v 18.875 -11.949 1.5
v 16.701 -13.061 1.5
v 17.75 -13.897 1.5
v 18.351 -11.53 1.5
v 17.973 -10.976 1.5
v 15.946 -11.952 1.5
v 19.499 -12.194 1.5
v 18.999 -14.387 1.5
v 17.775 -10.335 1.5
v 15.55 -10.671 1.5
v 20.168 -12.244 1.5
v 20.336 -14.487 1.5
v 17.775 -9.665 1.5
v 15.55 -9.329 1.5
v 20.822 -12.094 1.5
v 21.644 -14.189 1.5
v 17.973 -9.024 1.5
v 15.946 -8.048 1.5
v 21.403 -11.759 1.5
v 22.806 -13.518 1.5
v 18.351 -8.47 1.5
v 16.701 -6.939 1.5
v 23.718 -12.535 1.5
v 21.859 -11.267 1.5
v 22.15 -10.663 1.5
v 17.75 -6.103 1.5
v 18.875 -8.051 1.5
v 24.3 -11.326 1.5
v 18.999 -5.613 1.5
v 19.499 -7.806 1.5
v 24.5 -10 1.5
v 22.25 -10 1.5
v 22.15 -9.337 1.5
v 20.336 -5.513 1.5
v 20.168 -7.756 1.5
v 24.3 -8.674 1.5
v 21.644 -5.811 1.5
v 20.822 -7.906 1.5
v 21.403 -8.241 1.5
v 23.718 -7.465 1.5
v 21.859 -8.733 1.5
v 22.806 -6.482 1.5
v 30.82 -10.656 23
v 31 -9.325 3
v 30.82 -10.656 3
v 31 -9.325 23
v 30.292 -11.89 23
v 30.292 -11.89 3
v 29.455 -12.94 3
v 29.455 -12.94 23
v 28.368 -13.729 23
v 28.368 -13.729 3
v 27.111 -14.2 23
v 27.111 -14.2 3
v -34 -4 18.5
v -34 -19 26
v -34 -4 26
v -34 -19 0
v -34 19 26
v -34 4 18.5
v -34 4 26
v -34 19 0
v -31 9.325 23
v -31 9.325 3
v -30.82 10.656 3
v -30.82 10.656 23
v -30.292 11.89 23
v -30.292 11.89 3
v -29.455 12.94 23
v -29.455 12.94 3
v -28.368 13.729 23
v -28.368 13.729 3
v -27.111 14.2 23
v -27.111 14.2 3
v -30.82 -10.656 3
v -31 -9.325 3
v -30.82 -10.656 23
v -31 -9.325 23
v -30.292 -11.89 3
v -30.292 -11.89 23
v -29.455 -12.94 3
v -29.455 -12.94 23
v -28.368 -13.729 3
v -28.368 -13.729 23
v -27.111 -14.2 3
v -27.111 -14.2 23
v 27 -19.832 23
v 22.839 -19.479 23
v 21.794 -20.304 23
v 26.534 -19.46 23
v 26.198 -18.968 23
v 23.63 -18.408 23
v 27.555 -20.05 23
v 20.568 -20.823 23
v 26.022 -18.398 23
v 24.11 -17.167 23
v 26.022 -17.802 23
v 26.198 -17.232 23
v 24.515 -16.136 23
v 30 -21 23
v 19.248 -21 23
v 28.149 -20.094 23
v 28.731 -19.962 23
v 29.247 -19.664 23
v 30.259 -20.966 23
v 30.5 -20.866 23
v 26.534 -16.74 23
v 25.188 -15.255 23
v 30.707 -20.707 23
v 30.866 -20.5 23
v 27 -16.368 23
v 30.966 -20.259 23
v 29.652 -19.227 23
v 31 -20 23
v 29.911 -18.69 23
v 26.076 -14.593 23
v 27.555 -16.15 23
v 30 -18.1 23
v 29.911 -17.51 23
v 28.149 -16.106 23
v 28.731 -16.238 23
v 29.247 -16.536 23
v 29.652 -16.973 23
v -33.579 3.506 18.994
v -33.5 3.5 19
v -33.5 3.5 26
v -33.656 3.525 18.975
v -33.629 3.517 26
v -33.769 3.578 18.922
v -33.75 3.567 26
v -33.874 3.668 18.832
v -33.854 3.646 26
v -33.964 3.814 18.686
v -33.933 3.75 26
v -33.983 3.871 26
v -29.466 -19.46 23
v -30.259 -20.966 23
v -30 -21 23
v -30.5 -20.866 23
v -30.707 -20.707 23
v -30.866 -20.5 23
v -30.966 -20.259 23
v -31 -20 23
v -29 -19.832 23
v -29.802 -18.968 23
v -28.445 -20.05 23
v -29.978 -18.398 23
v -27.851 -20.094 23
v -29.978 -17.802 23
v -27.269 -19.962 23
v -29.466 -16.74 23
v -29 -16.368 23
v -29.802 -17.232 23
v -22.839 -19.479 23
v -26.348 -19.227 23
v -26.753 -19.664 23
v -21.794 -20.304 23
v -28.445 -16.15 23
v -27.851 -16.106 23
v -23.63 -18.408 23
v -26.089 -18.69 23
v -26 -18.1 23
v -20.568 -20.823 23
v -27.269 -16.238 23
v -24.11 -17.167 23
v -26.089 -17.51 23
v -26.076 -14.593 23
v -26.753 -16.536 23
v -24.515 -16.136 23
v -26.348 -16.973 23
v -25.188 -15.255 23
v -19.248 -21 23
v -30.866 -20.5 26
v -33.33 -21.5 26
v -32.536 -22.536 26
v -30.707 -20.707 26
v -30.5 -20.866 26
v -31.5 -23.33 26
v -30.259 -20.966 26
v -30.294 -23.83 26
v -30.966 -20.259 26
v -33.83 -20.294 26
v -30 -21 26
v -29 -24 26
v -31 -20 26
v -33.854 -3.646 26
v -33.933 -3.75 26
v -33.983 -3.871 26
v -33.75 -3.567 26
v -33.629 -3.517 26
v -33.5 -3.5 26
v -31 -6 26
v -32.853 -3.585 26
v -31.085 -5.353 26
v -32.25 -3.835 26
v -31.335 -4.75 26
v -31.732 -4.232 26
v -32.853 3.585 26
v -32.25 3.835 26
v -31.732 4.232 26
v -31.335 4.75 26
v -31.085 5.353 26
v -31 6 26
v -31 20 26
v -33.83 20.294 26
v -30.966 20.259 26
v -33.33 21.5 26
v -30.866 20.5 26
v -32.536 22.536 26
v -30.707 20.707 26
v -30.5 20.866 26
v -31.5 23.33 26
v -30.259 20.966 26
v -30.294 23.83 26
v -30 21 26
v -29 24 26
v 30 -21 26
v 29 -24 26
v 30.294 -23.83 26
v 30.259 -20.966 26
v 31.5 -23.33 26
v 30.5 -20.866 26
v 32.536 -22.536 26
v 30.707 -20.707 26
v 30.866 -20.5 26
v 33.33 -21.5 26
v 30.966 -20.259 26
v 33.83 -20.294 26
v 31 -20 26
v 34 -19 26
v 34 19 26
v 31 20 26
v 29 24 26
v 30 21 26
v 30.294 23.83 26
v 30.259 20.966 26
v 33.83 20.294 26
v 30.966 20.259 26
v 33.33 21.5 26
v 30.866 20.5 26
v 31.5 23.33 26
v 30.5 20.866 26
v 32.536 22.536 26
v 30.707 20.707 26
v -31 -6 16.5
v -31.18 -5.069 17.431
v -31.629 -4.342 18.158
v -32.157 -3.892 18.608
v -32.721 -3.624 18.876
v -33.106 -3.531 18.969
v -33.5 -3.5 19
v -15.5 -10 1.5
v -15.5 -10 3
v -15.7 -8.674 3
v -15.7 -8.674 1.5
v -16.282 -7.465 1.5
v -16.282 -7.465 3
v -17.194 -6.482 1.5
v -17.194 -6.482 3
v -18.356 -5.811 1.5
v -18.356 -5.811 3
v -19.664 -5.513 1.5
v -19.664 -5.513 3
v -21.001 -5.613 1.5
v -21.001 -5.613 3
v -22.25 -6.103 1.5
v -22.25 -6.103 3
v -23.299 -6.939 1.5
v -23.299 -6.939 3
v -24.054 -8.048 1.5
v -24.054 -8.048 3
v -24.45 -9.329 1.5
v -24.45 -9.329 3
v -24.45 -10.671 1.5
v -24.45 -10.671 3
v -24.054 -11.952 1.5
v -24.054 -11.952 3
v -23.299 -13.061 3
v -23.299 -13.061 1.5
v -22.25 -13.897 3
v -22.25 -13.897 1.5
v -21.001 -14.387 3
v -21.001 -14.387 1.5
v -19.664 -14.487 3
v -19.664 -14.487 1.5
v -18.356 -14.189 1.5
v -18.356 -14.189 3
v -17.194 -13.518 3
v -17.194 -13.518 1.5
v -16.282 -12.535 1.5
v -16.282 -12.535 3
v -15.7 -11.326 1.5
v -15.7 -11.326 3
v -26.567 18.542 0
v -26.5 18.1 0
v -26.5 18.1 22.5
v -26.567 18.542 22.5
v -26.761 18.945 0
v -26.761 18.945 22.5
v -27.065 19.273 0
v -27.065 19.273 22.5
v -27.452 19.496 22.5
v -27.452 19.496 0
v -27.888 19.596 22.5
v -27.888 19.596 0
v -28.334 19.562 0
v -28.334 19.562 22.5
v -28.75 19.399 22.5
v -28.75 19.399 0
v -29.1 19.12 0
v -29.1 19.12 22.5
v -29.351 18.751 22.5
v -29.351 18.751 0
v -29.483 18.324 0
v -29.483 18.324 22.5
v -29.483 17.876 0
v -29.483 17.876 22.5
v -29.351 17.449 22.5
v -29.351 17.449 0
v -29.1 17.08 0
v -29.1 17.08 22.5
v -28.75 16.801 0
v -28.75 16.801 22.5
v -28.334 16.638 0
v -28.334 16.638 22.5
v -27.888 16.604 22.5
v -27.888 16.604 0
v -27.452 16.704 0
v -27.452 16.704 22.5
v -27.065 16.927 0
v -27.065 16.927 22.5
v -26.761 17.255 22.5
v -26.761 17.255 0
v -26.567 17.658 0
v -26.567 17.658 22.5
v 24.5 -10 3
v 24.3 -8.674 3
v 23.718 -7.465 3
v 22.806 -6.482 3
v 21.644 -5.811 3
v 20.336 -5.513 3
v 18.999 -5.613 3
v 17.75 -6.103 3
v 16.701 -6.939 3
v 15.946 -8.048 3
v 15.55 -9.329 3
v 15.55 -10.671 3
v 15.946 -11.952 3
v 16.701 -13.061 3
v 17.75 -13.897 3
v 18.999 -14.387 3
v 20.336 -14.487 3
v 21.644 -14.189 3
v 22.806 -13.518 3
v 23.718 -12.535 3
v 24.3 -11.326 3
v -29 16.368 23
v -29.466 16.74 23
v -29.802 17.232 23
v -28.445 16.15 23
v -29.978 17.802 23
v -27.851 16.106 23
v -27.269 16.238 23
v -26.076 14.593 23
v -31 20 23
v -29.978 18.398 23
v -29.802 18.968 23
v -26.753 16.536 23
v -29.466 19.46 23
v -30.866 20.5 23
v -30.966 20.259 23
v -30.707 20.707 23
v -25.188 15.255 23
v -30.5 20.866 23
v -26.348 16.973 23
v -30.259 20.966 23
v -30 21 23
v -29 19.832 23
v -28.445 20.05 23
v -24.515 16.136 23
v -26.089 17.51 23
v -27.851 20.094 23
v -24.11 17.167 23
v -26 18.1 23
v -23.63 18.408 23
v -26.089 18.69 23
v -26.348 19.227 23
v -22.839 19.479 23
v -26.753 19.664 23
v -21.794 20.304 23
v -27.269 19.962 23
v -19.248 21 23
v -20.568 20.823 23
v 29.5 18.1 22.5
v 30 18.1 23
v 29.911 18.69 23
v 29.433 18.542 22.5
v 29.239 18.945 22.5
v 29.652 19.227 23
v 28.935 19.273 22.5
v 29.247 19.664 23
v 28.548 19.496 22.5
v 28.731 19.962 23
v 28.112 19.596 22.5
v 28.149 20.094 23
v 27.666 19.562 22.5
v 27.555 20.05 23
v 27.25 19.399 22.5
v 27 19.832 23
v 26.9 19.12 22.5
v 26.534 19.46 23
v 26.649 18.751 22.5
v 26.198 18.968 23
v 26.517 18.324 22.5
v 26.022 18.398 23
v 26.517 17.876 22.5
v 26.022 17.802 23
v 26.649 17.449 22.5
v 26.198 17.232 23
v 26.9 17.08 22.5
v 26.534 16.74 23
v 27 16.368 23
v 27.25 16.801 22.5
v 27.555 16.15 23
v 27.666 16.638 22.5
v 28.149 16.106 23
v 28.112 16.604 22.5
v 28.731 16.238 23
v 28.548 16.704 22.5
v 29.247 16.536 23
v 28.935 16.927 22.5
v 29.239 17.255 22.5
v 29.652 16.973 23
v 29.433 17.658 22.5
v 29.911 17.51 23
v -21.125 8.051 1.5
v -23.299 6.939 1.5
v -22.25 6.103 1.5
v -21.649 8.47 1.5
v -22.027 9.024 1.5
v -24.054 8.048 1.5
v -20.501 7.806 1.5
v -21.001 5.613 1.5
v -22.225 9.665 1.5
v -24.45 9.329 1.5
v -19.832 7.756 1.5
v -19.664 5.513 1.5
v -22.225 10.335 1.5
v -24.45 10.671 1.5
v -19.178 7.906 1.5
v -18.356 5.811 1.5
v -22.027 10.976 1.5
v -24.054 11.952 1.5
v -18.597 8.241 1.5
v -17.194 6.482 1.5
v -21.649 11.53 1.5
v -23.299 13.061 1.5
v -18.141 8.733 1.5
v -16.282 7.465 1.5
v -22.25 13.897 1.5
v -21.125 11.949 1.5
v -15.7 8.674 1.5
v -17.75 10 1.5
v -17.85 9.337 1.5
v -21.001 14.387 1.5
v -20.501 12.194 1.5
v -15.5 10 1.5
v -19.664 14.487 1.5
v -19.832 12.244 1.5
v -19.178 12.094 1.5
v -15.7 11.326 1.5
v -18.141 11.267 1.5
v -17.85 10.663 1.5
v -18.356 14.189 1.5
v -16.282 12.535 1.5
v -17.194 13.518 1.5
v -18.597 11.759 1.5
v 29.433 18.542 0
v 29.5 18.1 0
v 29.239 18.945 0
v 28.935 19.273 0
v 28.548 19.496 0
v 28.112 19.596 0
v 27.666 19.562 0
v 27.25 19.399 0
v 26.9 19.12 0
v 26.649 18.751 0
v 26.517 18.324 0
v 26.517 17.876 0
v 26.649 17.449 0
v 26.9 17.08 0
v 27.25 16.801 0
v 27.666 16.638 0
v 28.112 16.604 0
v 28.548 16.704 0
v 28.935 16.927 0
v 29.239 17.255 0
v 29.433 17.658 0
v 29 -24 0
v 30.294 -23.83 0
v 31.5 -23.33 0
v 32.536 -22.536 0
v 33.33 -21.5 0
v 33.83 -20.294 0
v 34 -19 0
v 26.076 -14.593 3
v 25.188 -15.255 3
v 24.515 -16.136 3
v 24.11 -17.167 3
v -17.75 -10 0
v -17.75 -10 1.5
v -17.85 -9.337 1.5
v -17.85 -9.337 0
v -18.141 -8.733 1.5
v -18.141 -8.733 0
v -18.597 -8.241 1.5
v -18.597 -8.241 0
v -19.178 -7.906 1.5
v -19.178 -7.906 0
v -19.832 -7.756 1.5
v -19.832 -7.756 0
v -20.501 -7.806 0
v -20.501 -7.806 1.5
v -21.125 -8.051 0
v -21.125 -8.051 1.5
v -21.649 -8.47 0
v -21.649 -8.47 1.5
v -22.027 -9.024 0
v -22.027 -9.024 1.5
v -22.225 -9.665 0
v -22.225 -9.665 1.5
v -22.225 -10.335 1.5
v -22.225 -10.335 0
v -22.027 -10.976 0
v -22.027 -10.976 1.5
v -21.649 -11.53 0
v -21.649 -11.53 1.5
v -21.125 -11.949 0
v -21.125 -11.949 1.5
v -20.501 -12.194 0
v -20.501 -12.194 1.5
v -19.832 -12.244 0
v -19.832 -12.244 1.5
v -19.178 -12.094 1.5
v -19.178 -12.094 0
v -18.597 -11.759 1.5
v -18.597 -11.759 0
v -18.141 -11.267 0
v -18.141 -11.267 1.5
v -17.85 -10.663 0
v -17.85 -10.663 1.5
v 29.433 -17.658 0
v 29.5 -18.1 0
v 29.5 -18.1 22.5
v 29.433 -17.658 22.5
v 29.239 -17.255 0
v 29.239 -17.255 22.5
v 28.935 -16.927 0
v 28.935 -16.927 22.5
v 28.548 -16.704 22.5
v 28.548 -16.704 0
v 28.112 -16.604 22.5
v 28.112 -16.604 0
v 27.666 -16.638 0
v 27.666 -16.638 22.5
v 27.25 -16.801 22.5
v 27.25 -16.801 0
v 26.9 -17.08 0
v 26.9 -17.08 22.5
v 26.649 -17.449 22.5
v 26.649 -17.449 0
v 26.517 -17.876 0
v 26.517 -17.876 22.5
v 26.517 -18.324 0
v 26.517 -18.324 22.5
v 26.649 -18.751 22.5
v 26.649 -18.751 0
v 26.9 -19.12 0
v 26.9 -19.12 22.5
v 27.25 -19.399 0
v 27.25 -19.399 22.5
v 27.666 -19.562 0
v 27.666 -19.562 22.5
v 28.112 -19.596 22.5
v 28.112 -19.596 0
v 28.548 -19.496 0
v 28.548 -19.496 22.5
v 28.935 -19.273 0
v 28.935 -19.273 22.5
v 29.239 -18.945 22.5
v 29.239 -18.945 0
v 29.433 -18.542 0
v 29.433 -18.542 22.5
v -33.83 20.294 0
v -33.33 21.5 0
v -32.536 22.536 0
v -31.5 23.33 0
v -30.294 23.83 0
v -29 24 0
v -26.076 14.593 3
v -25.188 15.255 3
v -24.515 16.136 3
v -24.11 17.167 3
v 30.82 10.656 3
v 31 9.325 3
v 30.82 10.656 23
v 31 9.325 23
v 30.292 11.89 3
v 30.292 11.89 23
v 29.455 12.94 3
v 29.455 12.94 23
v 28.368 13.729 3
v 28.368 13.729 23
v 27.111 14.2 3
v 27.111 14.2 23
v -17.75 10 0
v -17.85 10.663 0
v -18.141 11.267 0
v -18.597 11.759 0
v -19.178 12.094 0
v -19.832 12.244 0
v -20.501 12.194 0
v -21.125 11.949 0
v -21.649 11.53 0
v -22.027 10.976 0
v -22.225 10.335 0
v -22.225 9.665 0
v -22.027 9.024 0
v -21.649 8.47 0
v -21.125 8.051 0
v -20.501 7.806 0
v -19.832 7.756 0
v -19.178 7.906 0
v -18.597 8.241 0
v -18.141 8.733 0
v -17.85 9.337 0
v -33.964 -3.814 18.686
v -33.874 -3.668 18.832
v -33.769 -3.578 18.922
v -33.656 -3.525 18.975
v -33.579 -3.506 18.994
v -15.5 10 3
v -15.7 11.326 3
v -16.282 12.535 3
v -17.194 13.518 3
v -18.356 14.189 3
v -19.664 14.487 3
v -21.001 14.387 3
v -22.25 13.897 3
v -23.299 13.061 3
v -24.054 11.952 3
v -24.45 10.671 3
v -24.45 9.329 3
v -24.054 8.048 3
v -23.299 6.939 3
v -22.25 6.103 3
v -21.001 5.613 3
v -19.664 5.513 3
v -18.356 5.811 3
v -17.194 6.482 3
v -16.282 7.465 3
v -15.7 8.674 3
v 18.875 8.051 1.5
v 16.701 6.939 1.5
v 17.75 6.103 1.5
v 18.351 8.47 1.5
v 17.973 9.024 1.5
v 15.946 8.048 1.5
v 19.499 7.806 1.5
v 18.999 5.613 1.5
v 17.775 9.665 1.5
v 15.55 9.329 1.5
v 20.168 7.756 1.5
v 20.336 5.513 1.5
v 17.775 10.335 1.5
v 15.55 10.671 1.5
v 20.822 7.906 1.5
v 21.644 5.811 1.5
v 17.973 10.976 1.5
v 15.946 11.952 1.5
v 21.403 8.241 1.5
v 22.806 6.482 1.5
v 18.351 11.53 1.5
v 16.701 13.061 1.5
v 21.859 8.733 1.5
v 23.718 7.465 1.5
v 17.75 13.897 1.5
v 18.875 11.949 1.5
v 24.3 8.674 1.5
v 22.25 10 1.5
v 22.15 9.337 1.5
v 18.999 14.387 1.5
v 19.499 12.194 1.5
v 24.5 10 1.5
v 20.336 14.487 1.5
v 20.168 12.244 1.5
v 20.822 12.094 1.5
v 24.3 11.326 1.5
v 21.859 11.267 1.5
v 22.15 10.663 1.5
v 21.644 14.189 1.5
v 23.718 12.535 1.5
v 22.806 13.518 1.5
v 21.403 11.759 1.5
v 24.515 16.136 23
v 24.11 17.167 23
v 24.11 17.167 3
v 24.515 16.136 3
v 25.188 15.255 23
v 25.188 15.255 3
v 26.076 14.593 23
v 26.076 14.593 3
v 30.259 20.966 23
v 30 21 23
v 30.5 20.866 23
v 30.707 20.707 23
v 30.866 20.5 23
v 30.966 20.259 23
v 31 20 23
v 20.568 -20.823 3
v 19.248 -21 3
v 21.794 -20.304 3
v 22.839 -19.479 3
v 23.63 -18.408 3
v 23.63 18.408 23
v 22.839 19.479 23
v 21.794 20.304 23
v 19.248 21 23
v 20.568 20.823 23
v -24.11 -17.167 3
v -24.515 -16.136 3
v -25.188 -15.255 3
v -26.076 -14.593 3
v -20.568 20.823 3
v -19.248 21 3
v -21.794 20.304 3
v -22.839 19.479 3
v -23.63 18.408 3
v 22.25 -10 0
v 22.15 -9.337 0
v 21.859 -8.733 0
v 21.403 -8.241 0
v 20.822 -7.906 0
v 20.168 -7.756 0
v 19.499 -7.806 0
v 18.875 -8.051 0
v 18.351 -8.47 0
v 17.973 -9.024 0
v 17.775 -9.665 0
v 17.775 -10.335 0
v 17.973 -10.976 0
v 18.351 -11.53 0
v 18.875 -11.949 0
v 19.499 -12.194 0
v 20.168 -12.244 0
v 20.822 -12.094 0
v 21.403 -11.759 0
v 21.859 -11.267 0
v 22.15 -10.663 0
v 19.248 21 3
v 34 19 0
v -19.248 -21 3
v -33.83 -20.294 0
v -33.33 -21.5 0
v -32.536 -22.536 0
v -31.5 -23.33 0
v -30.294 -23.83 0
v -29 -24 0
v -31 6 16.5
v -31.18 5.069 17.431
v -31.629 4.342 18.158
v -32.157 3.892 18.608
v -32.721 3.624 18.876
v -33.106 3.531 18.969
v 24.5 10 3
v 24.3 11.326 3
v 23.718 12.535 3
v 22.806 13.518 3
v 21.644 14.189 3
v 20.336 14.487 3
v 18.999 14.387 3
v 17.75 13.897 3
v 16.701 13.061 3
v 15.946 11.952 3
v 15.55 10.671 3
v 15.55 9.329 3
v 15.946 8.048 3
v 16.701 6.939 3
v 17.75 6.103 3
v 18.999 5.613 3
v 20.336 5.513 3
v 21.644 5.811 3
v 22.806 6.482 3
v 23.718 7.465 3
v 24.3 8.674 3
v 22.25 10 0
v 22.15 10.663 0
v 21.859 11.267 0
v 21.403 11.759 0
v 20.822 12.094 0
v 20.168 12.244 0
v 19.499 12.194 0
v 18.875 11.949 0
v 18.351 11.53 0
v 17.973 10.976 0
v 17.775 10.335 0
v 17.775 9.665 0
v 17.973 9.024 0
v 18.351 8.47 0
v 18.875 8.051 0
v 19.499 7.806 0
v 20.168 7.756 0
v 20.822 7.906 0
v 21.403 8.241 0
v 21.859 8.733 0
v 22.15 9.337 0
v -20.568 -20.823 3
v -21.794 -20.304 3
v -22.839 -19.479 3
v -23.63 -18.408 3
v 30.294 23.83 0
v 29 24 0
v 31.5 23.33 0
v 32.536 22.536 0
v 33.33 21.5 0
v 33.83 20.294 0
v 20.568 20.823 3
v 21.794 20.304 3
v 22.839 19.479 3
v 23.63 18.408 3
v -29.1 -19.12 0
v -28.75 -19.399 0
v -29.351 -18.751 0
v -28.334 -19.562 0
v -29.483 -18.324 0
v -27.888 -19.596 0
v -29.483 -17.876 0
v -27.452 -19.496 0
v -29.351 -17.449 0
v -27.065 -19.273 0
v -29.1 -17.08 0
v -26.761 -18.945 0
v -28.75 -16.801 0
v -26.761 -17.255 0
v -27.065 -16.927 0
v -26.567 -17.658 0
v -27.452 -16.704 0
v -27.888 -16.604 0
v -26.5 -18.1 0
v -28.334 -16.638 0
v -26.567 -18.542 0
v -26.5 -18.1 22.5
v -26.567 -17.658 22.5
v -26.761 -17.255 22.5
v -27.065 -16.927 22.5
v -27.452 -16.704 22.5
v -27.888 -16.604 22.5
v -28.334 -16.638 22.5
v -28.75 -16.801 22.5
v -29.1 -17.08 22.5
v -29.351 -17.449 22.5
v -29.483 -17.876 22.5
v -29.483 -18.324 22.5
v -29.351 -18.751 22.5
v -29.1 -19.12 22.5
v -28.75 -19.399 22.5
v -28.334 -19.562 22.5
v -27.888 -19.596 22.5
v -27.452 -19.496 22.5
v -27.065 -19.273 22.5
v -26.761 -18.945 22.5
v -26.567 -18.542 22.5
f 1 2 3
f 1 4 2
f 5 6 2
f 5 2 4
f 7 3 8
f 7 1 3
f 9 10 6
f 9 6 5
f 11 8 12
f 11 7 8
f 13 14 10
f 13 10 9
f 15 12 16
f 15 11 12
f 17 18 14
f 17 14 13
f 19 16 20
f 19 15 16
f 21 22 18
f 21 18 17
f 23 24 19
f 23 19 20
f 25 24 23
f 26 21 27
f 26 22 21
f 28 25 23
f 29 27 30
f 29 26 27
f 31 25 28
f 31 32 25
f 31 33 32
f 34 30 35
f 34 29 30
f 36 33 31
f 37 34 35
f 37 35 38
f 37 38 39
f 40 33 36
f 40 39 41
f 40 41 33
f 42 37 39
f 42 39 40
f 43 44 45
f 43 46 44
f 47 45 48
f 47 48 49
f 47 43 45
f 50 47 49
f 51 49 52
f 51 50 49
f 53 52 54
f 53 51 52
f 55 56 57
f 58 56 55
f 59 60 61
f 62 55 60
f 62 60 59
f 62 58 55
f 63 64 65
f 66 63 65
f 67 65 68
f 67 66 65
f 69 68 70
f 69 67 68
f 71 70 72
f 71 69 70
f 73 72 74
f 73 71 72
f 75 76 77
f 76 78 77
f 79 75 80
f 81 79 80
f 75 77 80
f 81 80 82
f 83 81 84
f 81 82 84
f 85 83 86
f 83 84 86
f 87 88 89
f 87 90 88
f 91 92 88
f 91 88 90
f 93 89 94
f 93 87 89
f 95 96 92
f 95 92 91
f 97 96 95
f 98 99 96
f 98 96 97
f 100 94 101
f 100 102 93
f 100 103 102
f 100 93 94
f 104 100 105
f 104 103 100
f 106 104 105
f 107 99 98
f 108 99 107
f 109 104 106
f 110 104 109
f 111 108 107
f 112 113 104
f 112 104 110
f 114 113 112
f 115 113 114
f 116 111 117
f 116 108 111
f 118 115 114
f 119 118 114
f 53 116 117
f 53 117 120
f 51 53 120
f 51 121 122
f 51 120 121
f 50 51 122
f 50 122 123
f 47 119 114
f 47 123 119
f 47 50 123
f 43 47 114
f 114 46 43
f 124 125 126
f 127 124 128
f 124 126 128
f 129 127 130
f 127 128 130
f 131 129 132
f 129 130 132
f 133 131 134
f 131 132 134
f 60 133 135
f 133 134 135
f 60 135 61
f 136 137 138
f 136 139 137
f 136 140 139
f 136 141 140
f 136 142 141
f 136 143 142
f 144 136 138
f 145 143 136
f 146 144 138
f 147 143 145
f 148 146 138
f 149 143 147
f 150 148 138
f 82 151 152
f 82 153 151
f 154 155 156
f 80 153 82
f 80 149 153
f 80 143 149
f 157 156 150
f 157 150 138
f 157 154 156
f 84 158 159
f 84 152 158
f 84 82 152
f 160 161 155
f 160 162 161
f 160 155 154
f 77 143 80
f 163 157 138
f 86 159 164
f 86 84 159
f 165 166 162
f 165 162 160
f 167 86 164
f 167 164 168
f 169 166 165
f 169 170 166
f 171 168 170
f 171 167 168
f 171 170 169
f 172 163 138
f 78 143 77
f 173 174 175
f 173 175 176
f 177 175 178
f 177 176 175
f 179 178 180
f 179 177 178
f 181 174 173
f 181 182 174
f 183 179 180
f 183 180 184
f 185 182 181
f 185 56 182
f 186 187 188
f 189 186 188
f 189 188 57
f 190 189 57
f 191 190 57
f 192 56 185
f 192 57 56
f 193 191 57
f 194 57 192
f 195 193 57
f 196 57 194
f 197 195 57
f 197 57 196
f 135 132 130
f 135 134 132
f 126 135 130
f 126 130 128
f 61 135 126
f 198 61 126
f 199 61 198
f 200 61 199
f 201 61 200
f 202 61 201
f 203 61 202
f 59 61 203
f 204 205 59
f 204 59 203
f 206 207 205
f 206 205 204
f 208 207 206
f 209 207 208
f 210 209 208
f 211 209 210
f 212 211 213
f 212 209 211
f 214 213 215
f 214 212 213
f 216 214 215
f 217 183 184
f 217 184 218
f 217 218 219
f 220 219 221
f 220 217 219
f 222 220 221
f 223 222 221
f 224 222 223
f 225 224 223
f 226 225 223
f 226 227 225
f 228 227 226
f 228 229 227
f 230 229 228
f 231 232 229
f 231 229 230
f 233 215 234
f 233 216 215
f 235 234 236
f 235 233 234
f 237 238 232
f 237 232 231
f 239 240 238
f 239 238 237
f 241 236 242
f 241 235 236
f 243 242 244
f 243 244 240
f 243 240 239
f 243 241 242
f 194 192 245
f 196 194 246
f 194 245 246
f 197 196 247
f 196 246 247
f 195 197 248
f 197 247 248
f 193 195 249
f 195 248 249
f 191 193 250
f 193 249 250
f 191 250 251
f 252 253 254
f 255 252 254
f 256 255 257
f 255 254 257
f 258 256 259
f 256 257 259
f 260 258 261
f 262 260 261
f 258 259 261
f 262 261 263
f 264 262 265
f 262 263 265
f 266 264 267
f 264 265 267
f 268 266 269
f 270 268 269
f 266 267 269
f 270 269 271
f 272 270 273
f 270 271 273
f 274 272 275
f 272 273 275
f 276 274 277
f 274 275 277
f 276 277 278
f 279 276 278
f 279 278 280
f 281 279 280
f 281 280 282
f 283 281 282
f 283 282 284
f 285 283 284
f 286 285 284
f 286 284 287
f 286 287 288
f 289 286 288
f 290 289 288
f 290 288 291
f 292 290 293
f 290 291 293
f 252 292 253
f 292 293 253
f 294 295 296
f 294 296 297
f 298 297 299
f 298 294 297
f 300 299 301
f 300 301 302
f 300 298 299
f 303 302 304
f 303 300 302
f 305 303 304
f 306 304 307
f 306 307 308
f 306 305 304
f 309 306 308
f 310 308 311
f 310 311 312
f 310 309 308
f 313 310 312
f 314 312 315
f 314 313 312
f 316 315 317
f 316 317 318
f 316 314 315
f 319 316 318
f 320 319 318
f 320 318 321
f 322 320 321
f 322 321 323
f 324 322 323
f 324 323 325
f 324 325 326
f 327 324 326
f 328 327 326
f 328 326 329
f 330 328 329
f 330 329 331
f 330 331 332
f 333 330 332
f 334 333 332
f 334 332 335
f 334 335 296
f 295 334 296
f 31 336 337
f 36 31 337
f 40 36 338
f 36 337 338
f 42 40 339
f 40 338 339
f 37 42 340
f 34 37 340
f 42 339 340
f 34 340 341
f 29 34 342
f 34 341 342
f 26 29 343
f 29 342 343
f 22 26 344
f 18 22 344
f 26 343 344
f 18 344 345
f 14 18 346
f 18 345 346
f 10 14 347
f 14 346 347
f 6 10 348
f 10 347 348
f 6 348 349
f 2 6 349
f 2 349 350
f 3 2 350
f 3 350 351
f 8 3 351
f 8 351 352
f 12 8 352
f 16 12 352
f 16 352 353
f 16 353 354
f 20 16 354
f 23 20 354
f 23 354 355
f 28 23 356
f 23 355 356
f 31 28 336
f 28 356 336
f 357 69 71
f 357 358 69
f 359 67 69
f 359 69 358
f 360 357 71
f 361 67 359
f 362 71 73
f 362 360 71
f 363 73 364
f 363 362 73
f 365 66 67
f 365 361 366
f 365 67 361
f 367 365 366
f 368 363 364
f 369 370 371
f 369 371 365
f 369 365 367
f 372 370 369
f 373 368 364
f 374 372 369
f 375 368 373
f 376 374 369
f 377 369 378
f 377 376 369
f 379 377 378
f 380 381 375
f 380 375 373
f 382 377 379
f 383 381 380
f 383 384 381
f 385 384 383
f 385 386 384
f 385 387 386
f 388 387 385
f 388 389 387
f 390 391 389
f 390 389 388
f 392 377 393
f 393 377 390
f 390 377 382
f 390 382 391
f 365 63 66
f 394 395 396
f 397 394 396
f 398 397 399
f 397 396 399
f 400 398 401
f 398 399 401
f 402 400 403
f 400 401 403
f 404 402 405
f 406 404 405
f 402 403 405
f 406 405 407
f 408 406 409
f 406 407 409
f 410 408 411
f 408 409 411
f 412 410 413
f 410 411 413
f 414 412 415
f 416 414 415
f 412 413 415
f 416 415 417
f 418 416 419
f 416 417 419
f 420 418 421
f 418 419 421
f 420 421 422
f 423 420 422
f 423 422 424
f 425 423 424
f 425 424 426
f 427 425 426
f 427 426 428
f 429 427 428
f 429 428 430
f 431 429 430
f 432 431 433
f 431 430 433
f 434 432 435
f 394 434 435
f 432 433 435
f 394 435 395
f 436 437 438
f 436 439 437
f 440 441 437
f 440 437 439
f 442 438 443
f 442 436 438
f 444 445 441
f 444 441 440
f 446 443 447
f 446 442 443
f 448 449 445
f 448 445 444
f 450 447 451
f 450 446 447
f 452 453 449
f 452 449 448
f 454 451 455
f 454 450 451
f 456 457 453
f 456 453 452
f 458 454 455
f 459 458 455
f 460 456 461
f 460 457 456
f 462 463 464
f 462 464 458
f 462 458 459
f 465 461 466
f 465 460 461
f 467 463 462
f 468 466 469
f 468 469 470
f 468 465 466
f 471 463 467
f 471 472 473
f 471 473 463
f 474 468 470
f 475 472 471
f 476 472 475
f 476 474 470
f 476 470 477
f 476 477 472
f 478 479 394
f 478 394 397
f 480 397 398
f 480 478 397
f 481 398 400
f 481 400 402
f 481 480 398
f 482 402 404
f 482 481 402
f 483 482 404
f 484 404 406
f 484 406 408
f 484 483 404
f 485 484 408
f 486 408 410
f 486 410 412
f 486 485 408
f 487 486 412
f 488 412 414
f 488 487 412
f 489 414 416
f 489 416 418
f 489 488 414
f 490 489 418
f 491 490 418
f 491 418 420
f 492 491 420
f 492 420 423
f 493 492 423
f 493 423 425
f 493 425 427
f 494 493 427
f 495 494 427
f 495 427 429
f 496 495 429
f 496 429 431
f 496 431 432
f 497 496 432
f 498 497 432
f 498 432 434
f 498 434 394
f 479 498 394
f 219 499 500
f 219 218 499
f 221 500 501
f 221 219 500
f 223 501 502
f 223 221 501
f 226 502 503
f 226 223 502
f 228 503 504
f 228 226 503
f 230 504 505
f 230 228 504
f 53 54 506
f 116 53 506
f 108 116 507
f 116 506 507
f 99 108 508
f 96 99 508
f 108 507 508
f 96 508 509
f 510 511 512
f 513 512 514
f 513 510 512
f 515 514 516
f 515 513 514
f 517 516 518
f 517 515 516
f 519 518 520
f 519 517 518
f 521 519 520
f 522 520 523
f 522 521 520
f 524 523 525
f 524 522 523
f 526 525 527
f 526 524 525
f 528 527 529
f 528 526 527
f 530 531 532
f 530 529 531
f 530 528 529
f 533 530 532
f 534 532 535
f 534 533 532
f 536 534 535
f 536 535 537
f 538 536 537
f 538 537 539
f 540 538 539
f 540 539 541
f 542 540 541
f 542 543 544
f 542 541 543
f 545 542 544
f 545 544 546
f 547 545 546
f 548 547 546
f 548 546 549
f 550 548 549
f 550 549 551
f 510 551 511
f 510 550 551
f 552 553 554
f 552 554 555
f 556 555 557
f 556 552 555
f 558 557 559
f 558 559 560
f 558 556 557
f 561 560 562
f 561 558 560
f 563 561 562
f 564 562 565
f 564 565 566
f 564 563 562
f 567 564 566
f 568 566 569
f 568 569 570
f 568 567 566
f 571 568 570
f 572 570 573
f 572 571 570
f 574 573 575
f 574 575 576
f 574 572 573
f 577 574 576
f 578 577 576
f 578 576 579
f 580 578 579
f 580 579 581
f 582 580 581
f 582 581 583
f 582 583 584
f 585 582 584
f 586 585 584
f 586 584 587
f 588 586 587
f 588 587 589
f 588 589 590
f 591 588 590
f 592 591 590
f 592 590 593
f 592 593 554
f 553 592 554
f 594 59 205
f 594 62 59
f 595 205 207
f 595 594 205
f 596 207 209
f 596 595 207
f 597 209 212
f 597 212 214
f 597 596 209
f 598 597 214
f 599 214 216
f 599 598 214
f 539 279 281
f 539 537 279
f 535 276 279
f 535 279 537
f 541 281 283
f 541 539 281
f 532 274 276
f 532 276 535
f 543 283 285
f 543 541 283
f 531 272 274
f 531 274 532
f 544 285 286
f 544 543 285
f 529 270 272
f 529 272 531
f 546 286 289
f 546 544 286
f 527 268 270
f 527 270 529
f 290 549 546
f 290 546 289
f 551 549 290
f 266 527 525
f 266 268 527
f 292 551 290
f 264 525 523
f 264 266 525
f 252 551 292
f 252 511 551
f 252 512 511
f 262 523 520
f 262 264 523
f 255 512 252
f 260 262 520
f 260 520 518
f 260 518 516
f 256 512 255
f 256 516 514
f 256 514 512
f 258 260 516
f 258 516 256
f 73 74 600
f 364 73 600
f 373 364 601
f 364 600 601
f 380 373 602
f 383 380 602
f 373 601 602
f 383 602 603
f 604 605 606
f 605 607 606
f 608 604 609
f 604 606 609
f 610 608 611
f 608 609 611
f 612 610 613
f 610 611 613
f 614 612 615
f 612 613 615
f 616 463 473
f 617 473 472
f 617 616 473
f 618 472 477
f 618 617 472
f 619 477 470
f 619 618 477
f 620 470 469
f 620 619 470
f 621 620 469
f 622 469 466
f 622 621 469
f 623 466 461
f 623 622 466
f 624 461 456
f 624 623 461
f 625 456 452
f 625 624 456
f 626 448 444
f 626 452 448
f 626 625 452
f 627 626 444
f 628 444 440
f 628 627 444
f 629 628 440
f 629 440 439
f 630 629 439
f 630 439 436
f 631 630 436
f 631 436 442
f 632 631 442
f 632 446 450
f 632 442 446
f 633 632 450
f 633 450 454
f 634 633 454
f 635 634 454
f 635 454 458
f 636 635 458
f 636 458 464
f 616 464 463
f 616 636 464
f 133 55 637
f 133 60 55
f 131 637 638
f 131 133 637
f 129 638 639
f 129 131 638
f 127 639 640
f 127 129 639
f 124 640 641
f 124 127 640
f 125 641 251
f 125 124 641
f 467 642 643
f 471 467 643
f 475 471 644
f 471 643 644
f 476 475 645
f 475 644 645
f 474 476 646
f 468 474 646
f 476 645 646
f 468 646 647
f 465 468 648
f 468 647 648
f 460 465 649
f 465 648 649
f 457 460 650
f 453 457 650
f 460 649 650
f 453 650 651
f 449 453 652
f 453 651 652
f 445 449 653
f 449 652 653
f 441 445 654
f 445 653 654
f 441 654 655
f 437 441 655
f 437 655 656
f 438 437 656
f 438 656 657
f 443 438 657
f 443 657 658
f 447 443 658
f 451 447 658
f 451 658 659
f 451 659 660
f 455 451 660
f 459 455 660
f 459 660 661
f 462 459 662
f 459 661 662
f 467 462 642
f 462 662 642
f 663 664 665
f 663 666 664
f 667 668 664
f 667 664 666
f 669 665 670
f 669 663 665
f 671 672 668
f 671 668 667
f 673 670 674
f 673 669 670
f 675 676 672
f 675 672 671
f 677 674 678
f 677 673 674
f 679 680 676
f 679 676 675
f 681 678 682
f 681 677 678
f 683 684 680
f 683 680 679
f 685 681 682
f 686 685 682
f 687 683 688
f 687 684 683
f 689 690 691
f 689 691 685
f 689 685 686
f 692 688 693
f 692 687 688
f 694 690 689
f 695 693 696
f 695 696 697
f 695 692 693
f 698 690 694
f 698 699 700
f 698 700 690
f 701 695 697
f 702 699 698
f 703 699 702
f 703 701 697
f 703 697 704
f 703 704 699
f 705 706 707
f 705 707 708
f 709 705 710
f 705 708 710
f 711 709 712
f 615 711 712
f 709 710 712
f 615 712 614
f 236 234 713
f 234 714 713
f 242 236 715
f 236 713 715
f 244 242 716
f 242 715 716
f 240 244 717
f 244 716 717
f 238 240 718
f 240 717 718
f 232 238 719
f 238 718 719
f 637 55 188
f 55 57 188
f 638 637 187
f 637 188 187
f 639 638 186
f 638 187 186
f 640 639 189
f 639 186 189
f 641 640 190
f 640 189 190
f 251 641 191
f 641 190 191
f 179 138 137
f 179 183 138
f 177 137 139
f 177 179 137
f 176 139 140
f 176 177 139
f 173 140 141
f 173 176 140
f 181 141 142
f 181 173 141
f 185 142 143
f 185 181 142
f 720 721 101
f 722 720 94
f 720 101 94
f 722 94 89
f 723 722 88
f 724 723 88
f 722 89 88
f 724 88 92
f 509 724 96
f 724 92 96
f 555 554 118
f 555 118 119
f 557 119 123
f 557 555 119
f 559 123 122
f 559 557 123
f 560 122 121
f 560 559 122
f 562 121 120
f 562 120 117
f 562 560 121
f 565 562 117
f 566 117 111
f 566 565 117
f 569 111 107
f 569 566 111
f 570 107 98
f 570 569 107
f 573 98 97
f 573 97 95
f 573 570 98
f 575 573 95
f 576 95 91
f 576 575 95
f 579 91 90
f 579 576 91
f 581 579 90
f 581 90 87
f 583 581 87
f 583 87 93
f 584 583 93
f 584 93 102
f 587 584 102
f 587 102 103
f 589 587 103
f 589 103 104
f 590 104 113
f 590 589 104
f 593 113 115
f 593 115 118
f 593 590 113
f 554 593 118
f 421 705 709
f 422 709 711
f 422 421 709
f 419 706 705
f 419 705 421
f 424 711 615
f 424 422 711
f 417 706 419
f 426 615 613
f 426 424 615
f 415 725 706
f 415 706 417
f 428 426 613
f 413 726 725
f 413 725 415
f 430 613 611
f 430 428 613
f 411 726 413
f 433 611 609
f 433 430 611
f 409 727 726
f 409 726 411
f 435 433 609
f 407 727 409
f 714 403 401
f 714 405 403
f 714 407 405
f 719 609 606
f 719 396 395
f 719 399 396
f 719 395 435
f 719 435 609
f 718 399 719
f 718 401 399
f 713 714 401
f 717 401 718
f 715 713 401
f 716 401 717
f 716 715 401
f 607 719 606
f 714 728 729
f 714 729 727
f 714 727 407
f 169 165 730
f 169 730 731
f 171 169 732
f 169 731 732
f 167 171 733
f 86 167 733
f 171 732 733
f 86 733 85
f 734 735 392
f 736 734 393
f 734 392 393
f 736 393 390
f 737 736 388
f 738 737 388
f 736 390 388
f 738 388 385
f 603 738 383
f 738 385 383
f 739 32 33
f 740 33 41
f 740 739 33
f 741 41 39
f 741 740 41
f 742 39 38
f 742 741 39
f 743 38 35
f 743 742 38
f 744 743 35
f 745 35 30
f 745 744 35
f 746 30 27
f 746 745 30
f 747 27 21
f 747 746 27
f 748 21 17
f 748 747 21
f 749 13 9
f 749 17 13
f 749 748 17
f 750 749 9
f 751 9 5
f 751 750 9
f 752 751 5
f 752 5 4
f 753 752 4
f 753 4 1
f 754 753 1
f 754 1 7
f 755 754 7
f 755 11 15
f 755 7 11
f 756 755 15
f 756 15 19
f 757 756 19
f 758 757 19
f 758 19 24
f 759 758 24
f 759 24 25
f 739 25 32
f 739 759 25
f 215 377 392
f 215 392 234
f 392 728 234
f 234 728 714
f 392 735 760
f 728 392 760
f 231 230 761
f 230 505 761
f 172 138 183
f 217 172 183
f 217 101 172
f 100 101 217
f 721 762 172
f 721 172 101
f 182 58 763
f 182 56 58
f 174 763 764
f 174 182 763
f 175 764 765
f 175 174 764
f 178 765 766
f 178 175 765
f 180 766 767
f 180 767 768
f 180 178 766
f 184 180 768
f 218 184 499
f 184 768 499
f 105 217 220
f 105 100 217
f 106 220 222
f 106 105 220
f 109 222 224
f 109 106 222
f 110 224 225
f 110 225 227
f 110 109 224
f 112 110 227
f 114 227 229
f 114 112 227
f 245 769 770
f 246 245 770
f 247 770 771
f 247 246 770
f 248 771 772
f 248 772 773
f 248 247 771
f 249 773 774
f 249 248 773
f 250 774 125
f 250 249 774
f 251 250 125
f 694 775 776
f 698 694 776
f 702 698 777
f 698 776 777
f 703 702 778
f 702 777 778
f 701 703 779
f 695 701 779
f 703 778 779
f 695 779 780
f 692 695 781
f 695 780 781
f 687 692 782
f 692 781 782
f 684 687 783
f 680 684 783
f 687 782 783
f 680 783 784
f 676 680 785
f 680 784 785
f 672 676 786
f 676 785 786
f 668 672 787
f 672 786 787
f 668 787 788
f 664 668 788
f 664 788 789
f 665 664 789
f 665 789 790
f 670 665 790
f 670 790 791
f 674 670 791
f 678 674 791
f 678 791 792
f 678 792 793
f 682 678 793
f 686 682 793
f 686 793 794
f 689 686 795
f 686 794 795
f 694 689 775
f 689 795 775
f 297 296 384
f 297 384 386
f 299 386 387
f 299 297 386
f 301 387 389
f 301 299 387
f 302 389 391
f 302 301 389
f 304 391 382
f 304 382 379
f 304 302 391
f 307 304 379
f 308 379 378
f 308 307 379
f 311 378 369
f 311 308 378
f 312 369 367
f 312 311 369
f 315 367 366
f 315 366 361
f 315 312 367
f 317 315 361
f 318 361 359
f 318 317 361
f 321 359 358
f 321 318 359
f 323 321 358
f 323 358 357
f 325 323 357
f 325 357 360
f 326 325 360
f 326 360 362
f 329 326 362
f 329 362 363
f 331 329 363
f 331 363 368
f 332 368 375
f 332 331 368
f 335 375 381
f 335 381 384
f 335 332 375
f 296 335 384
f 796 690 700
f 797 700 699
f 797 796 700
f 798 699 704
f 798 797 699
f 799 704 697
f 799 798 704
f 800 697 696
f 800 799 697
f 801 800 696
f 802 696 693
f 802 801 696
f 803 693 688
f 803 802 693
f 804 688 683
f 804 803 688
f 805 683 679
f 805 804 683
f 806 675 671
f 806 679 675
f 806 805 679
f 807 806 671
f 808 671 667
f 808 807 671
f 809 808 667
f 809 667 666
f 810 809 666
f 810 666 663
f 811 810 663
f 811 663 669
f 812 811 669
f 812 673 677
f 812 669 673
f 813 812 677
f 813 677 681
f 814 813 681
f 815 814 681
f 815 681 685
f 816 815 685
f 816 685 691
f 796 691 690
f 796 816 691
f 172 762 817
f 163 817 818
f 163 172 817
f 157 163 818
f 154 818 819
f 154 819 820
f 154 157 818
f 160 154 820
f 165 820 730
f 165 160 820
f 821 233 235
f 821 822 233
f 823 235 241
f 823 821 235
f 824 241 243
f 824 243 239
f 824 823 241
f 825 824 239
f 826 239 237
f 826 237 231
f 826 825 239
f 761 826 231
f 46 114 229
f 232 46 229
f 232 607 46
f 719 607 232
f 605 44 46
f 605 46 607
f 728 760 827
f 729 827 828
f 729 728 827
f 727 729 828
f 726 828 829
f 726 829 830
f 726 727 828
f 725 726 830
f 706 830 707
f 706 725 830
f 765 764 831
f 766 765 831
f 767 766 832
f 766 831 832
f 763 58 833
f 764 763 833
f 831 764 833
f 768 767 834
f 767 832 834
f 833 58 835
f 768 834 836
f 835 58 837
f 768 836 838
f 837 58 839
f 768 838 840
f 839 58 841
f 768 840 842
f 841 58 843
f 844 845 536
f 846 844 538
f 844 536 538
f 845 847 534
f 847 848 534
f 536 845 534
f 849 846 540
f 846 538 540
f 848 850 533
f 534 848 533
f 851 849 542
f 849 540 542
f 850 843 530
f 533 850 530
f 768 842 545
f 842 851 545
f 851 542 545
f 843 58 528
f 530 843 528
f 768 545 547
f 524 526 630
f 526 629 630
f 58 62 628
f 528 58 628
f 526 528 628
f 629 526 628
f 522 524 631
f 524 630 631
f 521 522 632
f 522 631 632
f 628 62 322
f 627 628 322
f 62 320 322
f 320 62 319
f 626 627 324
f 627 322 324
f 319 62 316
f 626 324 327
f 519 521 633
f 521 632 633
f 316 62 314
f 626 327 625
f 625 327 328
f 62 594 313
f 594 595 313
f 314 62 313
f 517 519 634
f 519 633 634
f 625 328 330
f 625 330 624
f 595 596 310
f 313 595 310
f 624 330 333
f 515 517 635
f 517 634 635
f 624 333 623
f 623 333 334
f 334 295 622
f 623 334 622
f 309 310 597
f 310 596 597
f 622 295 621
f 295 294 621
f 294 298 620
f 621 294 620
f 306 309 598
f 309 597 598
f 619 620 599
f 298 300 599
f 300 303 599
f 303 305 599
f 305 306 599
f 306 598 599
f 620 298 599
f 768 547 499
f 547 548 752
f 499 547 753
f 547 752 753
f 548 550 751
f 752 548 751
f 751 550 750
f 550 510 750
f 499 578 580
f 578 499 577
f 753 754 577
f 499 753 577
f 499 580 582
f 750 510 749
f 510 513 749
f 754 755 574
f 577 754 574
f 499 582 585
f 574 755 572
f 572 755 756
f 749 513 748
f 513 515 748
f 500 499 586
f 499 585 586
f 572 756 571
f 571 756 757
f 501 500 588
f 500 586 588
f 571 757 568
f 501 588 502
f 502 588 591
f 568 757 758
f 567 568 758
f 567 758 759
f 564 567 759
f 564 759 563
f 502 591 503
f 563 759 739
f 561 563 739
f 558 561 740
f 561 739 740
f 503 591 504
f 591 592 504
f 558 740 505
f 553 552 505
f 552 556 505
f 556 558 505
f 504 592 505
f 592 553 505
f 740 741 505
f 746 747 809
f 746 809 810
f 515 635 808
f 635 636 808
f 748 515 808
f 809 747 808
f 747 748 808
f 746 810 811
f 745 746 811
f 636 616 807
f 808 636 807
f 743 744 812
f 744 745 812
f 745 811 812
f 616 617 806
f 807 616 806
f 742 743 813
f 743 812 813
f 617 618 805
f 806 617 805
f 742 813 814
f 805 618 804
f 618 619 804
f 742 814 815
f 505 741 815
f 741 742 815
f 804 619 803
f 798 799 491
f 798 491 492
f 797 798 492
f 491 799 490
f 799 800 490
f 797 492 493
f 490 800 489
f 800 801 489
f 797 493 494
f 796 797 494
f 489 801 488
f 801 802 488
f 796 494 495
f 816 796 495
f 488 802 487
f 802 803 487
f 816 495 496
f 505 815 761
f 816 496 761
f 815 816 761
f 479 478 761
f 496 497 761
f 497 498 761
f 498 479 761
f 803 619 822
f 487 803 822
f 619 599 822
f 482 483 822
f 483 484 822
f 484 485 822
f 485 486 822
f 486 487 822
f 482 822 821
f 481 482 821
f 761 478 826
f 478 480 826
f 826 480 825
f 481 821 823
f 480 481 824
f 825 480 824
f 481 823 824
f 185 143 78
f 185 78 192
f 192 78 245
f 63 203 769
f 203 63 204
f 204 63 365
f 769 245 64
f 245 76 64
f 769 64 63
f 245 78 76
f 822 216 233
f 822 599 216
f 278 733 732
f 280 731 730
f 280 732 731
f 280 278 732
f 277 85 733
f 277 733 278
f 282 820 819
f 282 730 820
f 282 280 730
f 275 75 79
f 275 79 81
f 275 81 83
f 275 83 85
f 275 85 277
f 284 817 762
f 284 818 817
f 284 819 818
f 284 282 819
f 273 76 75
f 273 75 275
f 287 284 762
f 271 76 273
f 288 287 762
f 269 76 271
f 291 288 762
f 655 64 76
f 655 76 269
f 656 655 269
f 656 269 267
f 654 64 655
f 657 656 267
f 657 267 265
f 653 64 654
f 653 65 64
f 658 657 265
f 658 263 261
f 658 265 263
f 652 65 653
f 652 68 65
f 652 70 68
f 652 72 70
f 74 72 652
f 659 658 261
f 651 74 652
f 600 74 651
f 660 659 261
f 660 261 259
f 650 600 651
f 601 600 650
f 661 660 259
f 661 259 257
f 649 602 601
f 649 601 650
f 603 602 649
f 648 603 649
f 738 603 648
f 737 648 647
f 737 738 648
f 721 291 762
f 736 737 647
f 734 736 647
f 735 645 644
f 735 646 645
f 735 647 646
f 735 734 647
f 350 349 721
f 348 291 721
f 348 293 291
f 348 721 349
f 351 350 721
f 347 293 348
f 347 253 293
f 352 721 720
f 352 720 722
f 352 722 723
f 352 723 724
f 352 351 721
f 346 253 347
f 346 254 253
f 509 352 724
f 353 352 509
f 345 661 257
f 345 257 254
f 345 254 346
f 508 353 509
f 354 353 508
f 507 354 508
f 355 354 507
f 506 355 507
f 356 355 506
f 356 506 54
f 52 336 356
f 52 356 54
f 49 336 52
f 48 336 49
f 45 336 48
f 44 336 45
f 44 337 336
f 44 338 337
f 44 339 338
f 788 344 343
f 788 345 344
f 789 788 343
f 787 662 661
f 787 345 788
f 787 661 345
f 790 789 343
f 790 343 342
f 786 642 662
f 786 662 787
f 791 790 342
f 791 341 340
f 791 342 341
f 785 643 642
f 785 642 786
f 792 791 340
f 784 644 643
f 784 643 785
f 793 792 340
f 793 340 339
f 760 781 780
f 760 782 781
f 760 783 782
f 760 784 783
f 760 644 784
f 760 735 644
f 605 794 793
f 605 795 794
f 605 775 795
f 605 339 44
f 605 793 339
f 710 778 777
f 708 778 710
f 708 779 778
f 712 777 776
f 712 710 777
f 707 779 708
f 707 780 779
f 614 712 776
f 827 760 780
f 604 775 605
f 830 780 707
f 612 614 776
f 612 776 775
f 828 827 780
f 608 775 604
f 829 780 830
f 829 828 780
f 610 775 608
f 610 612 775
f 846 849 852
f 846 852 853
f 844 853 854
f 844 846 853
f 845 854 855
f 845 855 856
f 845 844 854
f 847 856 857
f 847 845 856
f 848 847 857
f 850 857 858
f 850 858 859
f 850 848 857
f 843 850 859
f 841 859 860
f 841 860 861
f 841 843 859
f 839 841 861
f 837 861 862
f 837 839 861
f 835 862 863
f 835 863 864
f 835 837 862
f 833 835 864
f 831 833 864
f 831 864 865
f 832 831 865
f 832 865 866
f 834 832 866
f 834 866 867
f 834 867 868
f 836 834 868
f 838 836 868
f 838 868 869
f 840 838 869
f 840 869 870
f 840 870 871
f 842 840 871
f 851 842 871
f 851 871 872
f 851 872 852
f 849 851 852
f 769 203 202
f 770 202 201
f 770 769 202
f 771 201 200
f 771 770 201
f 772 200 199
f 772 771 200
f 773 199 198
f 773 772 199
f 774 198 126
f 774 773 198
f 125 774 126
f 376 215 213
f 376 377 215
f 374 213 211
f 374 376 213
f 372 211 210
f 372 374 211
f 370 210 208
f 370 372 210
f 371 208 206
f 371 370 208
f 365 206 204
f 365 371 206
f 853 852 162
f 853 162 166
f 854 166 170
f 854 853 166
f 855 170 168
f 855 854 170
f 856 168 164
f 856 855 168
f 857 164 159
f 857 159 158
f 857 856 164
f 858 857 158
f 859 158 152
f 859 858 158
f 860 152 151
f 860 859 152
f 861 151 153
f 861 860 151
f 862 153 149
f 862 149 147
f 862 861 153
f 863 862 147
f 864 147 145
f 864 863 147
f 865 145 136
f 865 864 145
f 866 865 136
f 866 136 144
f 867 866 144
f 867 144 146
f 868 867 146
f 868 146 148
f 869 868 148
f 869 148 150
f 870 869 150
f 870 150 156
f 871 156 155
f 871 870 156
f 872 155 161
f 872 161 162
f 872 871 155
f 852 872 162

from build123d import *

# Parameters (mm, degrees)
SCHIZZO1_W                   = 68
SCHIZZO1_H                   = 48
SCHIZZO1_R                   = 1.5
SCHIZZO1_R_2                 = 2.25
ESTRUSIONE_ESTRUSIONE1_DEPTH = 3
SCHIZZO2_W                   = 68
SCHIZZO2_H                   = 48
SCHIZZO2_R                   = 1.5
ESTRUSIONE_ESTRUSIONE2_DEPTH = 20
SCHIZZO3_W                   = 68
SCHIZZO3_H                   = 48
SCHIZZO3_W_2                 = 62
SCHIZZO3_H_2                 = 42
ESTRUSIONE_ESTRUSIONE3_DEPTH = 3
SMUSSO1_SIZE                 = 0.5
RACCORDO1_R                  = 5
SCHIZZO4_R                   = 4.5
TAGLIO_ESTRUSIONE1_DEPTH     = 1.5
RACCORDO2_R                  = 5
RACCORDO3_R                  = 1
TAGLIO_ESTRUSIONE2_REACH     = 78.655
SCHIZZO5_W                   = 7
SCHIZZO5_H                   = 7
RACCORDO4_R                  = 2.5
RACCORDO5_R                  = 0.5


with BuildPart() as part:
    # Schizzo1 → Estrusione-Estrusione1 (new body)
    with BuildSketch(Plane.XY):
        Rectangle(SCHIZZO1_W, SCHIZZO1_H)
        with Locations((-28, 18.1)):
            Circle(SCHIZZO1_R, mode=Mode.SUBTRACT)
        with Locations((-28, -18.1)):
            Circle(SCHIZZO1_R, mode=Mode.SUBTRACT)
        with Locations((28, -18.1)):
            Circle(SCHIZZO1_R, mode=Mode.SUBTRACT)
        with Locations((28, 18.1)):
            Circle(SCHIZZO1_R, mode=Mode.SUBTRACT)
        with Locations((20, -10)):
            Circle(SCHIZZO1_R_2, mode=Mode.SUBTRACT)
        with Locations((20, 10)):
            Circle(SCHIZZO1_R_2, mode=Mode.SUBTRACT)
        with Locations((-20, 10)):
            Circle(SCHIZZO1_R_2, mode=Mode.SUBTRACT)
        with Locations((-20, -10)):
            Circle(SCHIZZO1_R_2, mode=Mode.SUBTRACT)
    extrude(amount=ESTRUSIONE_ESTRUSIONE1_DEPTH)

    # Schizzo2 → Estrusione-Estrusione2 (add)
    with BuildSketch(Plane.XY.offset(3)):
        Rectangle(SCHIZZO2_W, SCHIZZO2_H)
        with BuildLine():
            ThreePointArc((-31, 15.454248689), (-25.224419663, 15.219695538), (-25.245004537, 21))
            Line((-25.245004537, 21), (25.245004537, 21))
            ThreePointArc((25.245004537, 21), (25.224419663, 15.219695538), (31, 15.454248689))
            Line((31, 15.454248689), (31, -15.454248689))
            ThreePointArc((31, -15.454248689), (25.224419663, -15.219695538), (25.245004537, -21))
            Line((25.245004537, -21), (-25.245004537, -21))
            ThreePointArc((-25.245004537, -21), (-25.224419663, -15.219695538), (-31, -15.454248689))
            Line((-31, -15.454248689), (-31, 15.454248689))
        make_face(mode=Mode.SUBTRACT)
        with BuildLine():
            ThreePointArc((-30.754995463, 21), (-30.880304462, 20.875580337), (-31, 20.745751311))
            Line((-31, 20.745751311), (-31, 21))
            Line((-31, 21), (-30.754995463, 21))
        make_face(mode=Mode.SUBTRACT)
        with Locations((-28, 18.1)):
            Circle(SCHIZZO2_R, mode=Mode.SUBTRACT)
        with BuildLine():
            Line((-31, -21), (-31, -20.745751311))
            ThreePointArc((-31, -20.745751311), (-30.880304462, -20.875580337), (-30.754995463, -21))
            Line((-30.754995463, -21), (-31, -21))
        make_face(mode=Mode.SUBTRACT)
        with BuildLine():
            Line((31, -21), (30.754995463, -21))
            ThreePointArc((30.754995463, -21), (30.880304462, -20.875580337), (31, -20.745751311))
            Line((31, -20.745751311), (31, -21))
        make_face(mode=Mode.SUBTRACT)
        with BuildLine():
            Line((31, 21), (31, 20.745751311))
            ThreePointArc((31, 20.745751311), (30.880304462, 20.875580337), (30.754995463, 21))
            Line((30.754995463, 21), (31, 21))
        make_face(mode=Mode.SUBTRACT)
        with Locations((-28, -18.1)):
            Circle(SCHIZZO2_R, mode=Mode.SUBTRACT)
        with Locations((28, -18.1)):
            Circle(SCHIZZO2_R, mode=Mode.SUBTRACT)
        with Locations((28, 18.1)):
            Circle(SCHIZZO2_R, mode=Mode.SUBTRACT)
    extrude(amount=ESTRUSIONE_ESTRUSIONE2_DEPTH)

    # Schizzo3 → Estrusione-Estrusione3 (add)
    with BuildSketch(Plane.XY.offset(23)):
        Rectangle(SCHIZZO3_W, SCHIZZO3_H)
        Rectangle(SCHIZZO3_W_2, SCHIZZO3_H_2, mode=Mode.SUBTRACT)
    extrude(amount=ESTRUSIONE_ESTRUSIONE3_DEPTH)

    # Smusso1
    smusso1_edges = [part.edges().sort_by_distance(p)[0] for p in [
        (-29.5, 18.1, 23),
        (26.5, -18.1, 23),
        (-29.5, -18.1, 23),
        (26.5, 18.1, 23),
    ]]
    chamfer(smusso1_edges, length=SMUSSO1_SIZE)

    # Raccordo1
    raccordo1_edges = [part.edges().sort_by_distance(p)[0] for p in [
        (34, 24, 13),
        (34, -24, 13),
        (-34, -24, 13),
        (-34, 24, 13),
    ]]
    fillet(raccordo1_edges, radius=RACCORDO1_R)

    # Schizzo4 → Taglio-Estrusione1 (cut)
    with BuildSketch(Plane.XY.offset(3)):
        with Locations((-20, 10)):
            Circle(SCHIZZO4_R)
        with Locations((-20, -10)):
            Circle(SCHIZZO4_R)
        with Locations((20, -10)):
            Circle(SCHIZZO4_R)
        with Locations((20, 10)):
            Circle(SCHIZZO4_R)
    extrude(amount=-TAGLIO_ESTRUSIONE1_DEPTH, mode=Mode.SUBTRACT)

    # Raccordo2
    raccordo2_edges = [part.edges().sort_by_distance(p)[0] for p in [
        (-31, 15.454248689, 13),
        (-25.245004537, 21, 13),
        (25.245004537, 21, 13),
        (31, 15.454248689, 13),
        (31, -15.454248689, 13),
        (25.245004537, -21, 13),
        (-25.245004537, -21, 13),
        (-31, -15.454248689, 13),
    ]]
    fillet(raccordo2_edges, radius=RACCORDO2_R)

    # Raccordo3
    raccordo3_edges = [part.edges().sort_by_distance(p)[0] for p in [
        (31, -21, 14.5),
        (-31, -21, 14.5),
        (-31, 21, 14.5),
        (31, 21, 14.5),
    ]]
    fillet(raccordo3_edges, radius=RACCORDO3_R)

    # Schizzo5 → Taglio-Estrusione2 (cut, up to next)
    with BuildSketch(Plane.ZY.offset(34), mode=Mode.PRIVATE) as taglio_estrusione2_sk1:
        with Locations((22.5, 0)):
            Rectangle(SCHIZZO5_W, SCHIZZO5_H)
    taglio_estrusione2_tool1 = extrude(taglio_estrusione2_sk1.sketch, amount=-TAGLIO_ESTRUSIONE2_REACH, mode=Mode.PRIVATE) & part.part
    add(taglio_estrusione2_tool1.solids().sort_by_distance((-34, 0, 22.5))[0], mode=Mode.SUBTRACT)

    # Raccordo4
    raccordo4_edges = [part.edges().sort_by_distance(p)[0] for p in [
        (-31, -3.5, 22.5),
        (-31, 0, 19),
        (-31, 3.5, 22.5),
    ]]
    fillet(raccordo4_edges, radius=RACCORDO4_R)

    # Raccordo5
    raccordo5_edges = [part.edges().sort_by_distance(p)[0] for p in [
        (-34, -3.5, 22.5),
        (-34, 0, 19),
        (-34, 3.5, 22.5),
    ]]
    fillet(raccordo5_edges, radius=RACCORDO5_R - 0.0001)  # a hair under: the kernel refuses the full size


solid = part.part
